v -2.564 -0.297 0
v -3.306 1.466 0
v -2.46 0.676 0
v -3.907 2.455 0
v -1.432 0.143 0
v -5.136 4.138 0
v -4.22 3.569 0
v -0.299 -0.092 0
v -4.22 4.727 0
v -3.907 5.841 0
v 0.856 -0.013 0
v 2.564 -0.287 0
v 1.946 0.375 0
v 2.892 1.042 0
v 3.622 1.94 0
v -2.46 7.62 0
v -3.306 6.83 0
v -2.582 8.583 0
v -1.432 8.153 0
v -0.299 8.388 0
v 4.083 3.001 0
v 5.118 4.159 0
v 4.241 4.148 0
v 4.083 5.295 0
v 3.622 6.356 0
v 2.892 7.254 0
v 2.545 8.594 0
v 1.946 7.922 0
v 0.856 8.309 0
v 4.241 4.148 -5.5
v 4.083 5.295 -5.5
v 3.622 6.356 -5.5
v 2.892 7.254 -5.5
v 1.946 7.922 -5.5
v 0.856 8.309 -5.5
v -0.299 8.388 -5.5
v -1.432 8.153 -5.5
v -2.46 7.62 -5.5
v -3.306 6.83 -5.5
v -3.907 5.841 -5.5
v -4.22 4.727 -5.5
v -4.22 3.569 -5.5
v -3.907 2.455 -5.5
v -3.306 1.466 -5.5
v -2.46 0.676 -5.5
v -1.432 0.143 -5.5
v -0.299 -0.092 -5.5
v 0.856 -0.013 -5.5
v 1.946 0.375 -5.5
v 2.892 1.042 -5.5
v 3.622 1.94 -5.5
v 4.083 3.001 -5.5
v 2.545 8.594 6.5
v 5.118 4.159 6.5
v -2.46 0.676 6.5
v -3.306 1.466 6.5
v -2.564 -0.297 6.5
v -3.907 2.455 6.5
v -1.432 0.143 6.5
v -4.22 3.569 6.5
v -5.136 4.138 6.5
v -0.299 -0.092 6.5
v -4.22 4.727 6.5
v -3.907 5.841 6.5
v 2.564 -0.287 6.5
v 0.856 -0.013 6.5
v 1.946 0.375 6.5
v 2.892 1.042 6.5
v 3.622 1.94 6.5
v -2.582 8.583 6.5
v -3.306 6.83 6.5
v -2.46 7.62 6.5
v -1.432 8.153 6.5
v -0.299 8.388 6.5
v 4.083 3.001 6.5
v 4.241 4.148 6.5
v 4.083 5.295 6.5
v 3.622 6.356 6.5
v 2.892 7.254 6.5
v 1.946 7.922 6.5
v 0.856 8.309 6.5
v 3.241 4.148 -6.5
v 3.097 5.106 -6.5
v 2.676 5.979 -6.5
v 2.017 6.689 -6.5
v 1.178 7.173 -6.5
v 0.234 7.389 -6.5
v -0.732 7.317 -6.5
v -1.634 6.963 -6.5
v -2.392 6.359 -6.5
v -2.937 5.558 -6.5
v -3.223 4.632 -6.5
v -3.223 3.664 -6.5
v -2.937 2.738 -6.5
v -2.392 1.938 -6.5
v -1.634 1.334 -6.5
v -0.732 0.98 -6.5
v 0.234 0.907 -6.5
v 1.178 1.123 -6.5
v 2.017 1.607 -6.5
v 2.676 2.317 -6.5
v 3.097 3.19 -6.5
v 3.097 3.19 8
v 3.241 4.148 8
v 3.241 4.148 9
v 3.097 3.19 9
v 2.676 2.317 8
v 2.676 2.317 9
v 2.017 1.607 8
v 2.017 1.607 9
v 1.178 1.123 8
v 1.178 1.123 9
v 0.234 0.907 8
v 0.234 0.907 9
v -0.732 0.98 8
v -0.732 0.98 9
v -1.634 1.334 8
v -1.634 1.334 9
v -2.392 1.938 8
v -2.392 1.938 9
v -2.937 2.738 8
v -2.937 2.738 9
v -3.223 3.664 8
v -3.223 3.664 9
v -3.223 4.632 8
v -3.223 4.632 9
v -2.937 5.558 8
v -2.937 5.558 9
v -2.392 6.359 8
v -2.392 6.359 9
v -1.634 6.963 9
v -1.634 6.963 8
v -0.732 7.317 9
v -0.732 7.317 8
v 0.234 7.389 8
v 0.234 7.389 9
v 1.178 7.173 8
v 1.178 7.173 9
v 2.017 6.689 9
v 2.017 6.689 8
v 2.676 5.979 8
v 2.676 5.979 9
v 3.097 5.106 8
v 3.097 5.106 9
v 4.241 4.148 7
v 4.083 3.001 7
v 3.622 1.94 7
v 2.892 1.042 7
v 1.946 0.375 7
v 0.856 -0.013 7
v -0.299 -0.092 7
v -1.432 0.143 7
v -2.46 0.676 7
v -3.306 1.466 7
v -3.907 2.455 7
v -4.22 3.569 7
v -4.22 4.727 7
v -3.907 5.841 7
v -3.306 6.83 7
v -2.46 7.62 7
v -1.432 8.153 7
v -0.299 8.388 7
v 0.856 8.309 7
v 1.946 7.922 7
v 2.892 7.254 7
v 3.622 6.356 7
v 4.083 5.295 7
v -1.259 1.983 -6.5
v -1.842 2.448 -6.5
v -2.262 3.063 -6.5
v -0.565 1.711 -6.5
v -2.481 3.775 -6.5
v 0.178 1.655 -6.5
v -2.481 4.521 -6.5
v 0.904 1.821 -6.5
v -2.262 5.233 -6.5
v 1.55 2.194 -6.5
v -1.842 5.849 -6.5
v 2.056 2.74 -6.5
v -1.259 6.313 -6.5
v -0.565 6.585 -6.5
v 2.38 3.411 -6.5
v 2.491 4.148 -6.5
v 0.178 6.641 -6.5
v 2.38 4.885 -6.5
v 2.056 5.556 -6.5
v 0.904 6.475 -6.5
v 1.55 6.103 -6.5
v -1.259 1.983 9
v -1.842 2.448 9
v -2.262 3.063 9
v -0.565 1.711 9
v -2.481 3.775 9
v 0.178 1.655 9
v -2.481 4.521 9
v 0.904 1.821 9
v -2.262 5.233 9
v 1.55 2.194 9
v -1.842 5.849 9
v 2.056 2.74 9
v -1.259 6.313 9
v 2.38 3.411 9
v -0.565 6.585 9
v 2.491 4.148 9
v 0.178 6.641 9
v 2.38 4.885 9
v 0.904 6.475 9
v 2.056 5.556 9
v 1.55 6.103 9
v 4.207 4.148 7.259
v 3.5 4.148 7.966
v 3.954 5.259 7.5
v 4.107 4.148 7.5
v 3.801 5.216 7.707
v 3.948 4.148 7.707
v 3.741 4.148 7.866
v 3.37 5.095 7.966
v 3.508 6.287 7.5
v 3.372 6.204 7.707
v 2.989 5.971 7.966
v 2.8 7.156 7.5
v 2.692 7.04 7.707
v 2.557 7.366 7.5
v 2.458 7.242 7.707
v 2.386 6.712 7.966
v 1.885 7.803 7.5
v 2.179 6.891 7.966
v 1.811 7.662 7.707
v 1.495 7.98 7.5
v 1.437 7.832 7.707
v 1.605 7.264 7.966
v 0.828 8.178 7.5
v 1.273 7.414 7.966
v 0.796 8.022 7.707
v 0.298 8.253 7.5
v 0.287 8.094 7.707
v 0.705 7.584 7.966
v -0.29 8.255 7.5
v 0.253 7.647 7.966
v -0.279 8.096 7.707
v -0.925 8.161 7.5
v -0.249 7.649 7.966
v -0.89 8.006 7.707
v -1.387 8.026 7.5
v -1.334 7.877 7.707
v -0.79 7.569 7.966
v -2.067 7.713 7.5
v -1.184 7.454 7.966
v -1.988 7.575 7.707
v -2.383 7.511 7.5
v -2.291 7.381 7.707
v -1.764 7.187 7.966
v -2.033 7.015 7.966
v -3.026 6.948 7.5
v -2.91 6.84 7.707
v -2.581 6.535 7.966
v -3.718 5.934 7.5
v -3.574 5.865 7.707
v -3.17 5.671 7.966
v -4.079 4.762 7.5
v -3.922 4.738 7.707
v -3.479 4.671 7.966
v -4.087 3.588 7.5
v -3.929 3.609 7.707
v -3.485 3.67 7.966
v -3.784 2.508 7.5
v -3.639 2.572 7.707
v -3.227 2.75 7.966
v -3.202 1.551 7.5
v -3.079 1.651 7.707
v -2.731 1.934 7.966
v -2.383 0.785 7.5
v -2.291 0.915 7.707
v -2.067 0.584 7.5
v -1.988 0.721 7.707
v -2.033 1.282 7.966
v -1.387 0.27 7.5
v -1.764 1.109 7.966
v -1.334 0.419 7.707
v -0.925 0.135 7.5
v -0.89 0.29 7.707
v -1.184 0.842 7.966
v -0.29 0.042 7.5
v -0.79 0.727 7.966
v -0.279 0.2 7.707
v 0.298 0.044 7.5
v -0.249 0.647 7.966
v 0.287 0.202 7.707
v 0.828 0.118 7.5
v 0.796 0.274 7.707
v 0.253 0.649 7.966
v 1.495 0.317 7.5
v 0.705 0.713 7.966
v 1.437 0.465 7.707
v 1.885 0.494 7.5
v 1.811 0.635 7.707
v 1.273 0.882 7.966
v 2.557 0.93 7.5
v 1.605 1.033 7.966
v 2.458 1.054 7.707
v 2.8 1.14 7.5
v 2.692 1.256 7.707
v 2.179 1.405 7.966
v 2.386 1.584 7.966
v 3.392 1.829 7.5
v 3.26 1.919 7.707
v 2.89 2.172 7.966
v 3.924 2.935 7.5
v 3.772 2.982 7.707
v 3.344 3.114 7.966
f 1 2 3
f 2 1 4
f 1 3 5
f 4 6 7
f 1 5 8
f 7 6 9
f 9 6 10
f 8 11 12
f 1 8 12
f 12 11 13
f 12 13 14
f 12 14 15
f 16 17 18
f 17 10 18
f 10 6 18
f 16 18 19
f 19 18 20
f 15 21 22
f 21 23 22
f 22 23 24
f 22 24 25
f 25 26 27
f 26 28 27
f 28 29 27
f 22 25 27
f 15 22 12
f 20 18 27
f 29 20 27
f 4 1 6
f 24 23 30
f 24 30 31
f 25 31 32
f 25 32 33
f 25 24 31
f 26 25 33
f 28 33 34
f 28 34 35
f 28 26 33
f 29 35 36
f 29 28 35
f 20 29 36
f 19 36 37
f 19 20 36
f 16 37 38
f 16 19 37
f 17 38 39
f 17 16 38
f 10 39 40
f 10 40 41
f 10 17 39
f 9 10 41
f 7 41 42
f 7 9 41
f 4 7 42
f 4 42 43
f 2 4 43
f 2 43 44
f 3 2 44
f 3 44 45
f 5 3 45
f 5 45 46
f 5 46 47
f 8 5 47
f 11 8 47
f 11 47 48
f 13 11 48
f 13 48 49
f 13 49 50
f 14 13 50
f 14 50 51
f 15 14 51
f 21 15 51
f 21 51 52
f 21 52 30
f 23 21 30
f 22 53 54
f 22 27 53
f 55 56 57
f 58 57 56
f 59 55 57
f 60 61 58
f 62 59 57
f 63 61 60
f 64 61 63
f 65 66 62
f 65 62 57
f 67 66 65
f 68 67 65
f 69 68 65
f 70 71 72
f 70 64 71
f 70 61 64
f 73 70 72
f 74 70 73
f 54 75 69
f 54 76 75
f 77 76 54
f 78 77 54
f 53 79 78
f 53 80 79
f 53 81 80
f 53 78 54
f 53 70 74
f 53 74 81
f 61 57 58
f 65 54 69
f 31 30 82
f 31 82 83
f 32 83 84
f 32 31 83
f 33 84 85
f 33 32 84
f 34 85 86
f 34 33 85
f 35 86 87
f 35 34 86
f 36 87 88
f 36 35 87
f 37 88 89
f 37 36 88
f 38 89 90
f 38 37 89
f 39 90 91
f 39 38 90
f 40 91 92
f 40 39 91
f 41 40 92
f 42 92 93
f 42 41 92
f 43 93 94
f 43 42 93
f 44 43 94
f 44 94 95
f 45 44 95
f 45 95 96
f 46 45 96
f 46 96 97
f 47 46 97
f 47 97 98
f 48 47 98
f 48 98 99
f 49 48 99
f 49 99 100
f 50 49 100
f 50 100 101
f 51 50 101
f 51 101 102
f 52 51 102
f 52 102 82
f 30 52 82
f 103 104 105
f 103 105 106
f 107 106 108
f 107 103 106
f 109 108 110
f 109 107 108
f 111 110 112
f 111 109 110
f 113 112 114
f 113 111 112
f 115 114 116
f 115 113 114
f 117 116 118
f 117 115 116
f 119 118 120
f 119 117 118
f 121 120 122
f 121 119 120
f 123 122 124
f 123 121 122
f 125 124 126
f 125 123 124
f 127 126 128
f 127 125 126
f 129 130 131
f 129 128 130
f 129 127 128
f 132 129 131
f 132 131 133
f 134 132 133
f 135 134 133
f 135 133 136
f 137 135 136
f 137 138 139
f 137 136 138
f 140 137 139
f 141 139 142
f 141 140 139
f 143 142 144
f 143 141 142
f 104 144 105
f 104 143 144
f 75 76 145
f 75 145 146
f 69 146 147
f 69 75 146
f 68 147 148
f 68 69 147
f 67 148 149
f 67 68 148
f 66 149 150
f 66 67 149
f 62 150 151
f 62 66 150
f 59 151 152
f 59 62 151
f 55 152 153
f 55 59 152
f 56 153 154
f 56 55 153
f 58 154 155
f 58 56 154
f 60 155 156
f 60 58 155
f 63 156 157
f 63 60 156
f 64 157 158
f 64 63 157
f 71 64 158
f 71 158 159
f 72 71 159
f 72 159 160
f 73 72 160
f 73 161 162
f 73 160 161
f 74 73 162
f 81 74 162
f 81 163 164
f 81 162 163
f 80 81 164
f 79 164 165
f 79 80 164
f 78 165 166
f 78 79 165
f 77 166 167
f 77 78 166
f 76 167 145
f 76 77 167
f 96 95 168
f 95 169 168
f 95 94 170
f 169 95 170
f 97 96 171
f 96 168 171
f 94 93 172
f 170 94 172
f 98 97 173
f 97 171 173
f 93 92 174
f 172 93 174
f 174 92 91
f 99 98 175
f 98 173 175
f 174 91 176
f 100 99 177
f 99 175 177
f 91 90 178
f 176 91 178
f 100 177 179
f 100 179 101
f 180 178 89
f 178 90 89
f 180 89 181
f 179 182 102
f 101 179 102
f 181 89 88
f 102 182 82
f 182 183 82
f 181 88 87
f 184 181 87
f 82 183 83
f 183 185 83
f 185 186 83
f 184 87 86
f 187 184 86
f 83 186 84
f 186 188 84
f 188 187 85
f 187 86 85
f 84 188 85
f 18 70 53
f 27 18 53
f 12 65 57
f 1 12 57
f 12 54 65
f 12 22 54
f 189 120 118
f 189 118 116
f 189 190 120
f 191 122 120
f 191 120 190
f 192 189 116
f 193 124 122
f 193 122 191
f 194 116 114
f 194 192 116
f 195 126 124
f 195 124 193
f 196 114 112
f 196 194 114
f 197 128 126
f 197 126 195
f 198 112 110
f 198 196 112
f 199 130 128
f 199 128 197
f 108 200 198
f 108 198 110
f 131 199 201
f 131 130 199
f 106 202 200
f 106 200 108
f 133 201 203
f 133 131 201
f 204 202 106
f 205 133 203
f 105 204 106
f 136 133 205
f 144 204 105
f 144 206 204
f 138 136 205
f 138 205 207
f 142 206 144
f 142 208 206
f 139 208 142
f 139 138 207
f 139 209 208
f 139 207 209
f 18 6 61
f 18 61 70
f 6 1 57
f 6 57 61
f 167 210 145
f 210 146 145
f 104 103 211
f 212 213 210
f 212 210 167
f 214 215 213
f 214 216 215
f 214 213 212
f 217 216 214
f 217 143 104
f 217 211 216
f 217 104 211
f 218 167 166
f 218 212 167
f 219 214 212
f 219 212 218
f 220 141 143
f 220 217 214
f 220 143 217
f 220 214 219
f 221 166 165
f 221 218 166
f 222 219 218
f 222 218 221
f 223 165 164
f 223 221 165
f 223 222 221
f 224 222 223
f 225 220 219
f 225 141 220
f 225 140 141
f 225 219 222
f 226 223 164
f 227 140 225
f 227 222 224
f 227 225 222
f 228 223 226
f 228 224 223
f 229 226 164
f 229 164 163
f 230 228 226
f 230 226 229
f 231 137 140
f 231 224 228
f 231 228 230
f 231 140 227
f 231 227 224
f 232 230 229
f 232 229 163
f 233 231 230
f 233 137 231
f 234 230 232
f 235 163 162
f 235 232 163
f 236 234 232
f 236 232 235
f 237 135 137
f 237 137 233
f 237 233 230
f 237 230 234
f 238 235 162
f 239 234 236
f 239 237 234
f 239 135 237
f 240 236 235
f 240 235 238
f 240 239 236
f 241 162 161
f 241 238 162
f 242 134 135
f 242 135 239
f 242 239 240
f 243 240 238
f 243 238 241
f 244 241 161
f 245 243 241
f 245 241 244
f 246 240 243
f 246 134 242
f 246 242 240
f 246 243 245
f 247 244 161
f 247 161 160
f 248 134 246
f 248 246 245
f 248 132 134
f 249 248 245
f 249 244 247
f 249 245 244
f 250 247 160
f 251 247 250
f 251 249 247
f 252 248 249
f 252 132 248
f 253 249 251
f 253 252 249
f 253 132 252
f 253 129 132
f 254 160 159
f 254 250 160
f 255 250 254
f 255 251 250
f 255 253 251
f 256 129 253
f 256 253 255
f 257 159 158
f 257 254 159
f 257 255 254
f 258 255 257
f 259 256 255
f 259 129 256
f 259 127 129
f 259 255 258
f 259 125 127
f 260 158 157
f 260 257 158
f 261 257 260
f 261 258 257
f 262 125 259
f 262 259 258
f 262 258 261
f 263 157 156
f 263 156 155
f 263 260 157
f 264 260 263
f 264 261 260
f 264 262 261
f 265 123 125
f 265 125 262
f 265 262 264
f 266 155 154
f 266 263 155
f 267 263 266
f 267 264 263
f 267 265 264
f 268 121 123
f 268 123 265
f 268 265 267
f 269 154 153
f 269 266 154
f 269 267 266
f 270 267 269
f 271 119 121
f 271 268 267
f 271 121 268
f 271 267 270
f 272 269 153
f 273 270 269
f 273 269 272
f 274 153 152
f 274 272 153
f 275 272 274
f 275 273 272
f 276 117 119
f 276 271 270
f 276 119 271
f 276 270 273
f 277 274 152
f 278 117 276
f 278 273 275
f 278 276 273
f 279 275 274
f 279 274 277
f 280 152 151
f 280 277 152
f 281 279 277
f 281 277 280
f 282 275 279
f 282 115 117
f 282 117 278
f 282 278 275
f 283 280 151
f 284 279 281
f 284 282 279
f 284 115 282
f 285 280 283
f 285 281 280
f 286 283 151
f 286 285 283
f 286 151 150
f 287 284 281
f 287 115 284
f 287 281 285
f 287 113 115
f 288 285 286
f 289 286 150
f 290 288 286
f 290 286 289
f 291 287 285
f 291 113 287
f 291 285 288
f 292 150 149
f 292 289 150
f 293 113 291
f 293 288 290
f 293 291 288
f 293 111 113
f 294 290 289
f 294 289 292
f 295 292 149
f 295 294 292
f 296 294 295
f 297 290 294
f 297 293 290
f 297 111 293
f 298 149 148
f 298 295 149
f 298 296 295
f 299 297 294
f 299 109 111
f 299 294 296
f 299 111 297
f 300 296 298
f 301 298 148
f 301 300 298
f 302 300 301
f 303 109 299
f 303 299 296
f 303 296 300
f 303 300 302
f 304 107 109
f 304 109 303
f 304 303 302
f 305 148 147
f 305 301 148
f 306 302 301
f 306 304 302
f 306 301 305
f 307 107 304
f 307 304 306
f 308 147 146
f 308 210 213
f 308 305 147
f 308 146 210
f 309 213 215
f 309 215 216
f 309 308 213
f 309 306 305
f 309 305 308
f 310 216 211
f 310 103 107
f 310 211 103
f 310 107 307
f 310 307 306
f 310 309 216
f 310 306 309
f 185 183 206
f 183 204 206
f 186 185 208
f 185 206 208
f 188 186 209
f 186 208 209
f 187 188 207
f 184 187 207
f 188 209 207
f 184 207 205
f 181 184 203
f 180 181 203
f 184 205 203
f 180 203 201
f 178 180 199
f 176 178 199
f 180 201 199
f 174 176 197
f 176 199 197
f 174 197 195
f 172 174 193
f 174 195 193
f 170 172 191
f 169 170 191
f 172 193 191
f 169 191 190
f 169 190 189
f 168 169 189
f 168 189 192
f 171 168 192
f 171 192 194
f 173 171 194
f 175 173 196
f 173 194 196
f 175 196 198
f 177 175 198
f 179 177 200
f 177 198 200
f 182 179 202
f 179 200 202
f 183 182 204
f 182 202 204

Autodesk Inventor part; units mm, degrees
ref_plane "YZ Plane" through (0, 0, 0) normal (1, 0, 0) x (0, 1, 0)
ref_plane "XZ Plane" through (0, 0, 0) normal (0, 1, 0) x (-1, 0, 0)
ref_plane "XY Plane" through (0, 0, 0) normal (0, 0, 1) x (1, 0, 0)
sketch "Sketch1" plane through (0, 0, 0) normal (0, 0, 1) x (1, 0, 0)
  circle A0 centre (-0.0091, 4.1481) radius 4.25 projected
  point P0 (0, 0)
extrude "Extrusion1" add sketch "Sketch1" against normal blind 6.5
thread "Thread1" size "M9x1.25" class "6g" standard "ANSI Metric M Profile" full length
sketch "Sketch2" plane through (-0.0091, 4.1481, 0) normal (0, 0, 1) x (1, 0, 0)
  line L0 (2.5727, -4.4349) -> (-2.5544, -4.4455)
  line L1 (-2.5544, -4.4455) -> (-5.1271, -0.0106)
  line L2 (-5.1271, -0.0106) -> (-2.5727, 4.4349)
  line L3 (-2.5727, 4.4349) -> (2.5544, 4.4455)
  line L4 (2.5544, 4.4455) -> (5.1271, 0.0106)
  line L5 (5.1271, 0.0106) -> (2.5727, -4.4349)
  point P0 (0.0091, -4.1481)
  point P1 (0, 0)
extrude "Extrusion2" add sketch "Sketch2" along normal blind 6.5
sketch "Sketch3" plane through (-0.0091, 4.1481, 6.5) normal (0, 0, 1) x (1, 0, 0)
  circle A0 centre (0, 0) radius 4.25
  point P0 (0.0091, -4.1481)
extrude "Extrusion3" add sketch "Sketch3" along normal blind 1.5
fillet "Fillet1" radius 1 1 edges at (-4.2591, 4.1481, 8)
sketch "Sketch4" plane through (-0.0091, 4.1481, 8) normal (0, 0, 1) x (1, 0, 0)
  circle A0 centre (0, 0) radius 3.25
  point P0 (0.0091, -4.1481)
extrude "Extrusion4" add sketch "Sketch4" along normal blind 1
sketch "Sketch5" plane through (-0.0091, 4.1481, 9) normal (0, 0, 1) x (1, 0, 0)
  point P0 (0.0091, -4.1481)
sketch "Sketch6" plane through (-0.0091, 4.1481, 9) normal (0, 0, 1) x (1, 0, 0)
  circle A0 centre (0, 0) radius 3.25 projected
  circle A1 centre (0, 0) radius 2.5
  point P0 (0.0091, -4.1481)
  dimension "d11" = 5
extrude "Extrusion5" cut sketch "Sketch6" against normal through all contours A1
chamfer "Chamfer1" distance 1 angle 45 1 edges at (-4.2591, 4.1481, -6.5)
properties part number "Pushfit-Adapter"
